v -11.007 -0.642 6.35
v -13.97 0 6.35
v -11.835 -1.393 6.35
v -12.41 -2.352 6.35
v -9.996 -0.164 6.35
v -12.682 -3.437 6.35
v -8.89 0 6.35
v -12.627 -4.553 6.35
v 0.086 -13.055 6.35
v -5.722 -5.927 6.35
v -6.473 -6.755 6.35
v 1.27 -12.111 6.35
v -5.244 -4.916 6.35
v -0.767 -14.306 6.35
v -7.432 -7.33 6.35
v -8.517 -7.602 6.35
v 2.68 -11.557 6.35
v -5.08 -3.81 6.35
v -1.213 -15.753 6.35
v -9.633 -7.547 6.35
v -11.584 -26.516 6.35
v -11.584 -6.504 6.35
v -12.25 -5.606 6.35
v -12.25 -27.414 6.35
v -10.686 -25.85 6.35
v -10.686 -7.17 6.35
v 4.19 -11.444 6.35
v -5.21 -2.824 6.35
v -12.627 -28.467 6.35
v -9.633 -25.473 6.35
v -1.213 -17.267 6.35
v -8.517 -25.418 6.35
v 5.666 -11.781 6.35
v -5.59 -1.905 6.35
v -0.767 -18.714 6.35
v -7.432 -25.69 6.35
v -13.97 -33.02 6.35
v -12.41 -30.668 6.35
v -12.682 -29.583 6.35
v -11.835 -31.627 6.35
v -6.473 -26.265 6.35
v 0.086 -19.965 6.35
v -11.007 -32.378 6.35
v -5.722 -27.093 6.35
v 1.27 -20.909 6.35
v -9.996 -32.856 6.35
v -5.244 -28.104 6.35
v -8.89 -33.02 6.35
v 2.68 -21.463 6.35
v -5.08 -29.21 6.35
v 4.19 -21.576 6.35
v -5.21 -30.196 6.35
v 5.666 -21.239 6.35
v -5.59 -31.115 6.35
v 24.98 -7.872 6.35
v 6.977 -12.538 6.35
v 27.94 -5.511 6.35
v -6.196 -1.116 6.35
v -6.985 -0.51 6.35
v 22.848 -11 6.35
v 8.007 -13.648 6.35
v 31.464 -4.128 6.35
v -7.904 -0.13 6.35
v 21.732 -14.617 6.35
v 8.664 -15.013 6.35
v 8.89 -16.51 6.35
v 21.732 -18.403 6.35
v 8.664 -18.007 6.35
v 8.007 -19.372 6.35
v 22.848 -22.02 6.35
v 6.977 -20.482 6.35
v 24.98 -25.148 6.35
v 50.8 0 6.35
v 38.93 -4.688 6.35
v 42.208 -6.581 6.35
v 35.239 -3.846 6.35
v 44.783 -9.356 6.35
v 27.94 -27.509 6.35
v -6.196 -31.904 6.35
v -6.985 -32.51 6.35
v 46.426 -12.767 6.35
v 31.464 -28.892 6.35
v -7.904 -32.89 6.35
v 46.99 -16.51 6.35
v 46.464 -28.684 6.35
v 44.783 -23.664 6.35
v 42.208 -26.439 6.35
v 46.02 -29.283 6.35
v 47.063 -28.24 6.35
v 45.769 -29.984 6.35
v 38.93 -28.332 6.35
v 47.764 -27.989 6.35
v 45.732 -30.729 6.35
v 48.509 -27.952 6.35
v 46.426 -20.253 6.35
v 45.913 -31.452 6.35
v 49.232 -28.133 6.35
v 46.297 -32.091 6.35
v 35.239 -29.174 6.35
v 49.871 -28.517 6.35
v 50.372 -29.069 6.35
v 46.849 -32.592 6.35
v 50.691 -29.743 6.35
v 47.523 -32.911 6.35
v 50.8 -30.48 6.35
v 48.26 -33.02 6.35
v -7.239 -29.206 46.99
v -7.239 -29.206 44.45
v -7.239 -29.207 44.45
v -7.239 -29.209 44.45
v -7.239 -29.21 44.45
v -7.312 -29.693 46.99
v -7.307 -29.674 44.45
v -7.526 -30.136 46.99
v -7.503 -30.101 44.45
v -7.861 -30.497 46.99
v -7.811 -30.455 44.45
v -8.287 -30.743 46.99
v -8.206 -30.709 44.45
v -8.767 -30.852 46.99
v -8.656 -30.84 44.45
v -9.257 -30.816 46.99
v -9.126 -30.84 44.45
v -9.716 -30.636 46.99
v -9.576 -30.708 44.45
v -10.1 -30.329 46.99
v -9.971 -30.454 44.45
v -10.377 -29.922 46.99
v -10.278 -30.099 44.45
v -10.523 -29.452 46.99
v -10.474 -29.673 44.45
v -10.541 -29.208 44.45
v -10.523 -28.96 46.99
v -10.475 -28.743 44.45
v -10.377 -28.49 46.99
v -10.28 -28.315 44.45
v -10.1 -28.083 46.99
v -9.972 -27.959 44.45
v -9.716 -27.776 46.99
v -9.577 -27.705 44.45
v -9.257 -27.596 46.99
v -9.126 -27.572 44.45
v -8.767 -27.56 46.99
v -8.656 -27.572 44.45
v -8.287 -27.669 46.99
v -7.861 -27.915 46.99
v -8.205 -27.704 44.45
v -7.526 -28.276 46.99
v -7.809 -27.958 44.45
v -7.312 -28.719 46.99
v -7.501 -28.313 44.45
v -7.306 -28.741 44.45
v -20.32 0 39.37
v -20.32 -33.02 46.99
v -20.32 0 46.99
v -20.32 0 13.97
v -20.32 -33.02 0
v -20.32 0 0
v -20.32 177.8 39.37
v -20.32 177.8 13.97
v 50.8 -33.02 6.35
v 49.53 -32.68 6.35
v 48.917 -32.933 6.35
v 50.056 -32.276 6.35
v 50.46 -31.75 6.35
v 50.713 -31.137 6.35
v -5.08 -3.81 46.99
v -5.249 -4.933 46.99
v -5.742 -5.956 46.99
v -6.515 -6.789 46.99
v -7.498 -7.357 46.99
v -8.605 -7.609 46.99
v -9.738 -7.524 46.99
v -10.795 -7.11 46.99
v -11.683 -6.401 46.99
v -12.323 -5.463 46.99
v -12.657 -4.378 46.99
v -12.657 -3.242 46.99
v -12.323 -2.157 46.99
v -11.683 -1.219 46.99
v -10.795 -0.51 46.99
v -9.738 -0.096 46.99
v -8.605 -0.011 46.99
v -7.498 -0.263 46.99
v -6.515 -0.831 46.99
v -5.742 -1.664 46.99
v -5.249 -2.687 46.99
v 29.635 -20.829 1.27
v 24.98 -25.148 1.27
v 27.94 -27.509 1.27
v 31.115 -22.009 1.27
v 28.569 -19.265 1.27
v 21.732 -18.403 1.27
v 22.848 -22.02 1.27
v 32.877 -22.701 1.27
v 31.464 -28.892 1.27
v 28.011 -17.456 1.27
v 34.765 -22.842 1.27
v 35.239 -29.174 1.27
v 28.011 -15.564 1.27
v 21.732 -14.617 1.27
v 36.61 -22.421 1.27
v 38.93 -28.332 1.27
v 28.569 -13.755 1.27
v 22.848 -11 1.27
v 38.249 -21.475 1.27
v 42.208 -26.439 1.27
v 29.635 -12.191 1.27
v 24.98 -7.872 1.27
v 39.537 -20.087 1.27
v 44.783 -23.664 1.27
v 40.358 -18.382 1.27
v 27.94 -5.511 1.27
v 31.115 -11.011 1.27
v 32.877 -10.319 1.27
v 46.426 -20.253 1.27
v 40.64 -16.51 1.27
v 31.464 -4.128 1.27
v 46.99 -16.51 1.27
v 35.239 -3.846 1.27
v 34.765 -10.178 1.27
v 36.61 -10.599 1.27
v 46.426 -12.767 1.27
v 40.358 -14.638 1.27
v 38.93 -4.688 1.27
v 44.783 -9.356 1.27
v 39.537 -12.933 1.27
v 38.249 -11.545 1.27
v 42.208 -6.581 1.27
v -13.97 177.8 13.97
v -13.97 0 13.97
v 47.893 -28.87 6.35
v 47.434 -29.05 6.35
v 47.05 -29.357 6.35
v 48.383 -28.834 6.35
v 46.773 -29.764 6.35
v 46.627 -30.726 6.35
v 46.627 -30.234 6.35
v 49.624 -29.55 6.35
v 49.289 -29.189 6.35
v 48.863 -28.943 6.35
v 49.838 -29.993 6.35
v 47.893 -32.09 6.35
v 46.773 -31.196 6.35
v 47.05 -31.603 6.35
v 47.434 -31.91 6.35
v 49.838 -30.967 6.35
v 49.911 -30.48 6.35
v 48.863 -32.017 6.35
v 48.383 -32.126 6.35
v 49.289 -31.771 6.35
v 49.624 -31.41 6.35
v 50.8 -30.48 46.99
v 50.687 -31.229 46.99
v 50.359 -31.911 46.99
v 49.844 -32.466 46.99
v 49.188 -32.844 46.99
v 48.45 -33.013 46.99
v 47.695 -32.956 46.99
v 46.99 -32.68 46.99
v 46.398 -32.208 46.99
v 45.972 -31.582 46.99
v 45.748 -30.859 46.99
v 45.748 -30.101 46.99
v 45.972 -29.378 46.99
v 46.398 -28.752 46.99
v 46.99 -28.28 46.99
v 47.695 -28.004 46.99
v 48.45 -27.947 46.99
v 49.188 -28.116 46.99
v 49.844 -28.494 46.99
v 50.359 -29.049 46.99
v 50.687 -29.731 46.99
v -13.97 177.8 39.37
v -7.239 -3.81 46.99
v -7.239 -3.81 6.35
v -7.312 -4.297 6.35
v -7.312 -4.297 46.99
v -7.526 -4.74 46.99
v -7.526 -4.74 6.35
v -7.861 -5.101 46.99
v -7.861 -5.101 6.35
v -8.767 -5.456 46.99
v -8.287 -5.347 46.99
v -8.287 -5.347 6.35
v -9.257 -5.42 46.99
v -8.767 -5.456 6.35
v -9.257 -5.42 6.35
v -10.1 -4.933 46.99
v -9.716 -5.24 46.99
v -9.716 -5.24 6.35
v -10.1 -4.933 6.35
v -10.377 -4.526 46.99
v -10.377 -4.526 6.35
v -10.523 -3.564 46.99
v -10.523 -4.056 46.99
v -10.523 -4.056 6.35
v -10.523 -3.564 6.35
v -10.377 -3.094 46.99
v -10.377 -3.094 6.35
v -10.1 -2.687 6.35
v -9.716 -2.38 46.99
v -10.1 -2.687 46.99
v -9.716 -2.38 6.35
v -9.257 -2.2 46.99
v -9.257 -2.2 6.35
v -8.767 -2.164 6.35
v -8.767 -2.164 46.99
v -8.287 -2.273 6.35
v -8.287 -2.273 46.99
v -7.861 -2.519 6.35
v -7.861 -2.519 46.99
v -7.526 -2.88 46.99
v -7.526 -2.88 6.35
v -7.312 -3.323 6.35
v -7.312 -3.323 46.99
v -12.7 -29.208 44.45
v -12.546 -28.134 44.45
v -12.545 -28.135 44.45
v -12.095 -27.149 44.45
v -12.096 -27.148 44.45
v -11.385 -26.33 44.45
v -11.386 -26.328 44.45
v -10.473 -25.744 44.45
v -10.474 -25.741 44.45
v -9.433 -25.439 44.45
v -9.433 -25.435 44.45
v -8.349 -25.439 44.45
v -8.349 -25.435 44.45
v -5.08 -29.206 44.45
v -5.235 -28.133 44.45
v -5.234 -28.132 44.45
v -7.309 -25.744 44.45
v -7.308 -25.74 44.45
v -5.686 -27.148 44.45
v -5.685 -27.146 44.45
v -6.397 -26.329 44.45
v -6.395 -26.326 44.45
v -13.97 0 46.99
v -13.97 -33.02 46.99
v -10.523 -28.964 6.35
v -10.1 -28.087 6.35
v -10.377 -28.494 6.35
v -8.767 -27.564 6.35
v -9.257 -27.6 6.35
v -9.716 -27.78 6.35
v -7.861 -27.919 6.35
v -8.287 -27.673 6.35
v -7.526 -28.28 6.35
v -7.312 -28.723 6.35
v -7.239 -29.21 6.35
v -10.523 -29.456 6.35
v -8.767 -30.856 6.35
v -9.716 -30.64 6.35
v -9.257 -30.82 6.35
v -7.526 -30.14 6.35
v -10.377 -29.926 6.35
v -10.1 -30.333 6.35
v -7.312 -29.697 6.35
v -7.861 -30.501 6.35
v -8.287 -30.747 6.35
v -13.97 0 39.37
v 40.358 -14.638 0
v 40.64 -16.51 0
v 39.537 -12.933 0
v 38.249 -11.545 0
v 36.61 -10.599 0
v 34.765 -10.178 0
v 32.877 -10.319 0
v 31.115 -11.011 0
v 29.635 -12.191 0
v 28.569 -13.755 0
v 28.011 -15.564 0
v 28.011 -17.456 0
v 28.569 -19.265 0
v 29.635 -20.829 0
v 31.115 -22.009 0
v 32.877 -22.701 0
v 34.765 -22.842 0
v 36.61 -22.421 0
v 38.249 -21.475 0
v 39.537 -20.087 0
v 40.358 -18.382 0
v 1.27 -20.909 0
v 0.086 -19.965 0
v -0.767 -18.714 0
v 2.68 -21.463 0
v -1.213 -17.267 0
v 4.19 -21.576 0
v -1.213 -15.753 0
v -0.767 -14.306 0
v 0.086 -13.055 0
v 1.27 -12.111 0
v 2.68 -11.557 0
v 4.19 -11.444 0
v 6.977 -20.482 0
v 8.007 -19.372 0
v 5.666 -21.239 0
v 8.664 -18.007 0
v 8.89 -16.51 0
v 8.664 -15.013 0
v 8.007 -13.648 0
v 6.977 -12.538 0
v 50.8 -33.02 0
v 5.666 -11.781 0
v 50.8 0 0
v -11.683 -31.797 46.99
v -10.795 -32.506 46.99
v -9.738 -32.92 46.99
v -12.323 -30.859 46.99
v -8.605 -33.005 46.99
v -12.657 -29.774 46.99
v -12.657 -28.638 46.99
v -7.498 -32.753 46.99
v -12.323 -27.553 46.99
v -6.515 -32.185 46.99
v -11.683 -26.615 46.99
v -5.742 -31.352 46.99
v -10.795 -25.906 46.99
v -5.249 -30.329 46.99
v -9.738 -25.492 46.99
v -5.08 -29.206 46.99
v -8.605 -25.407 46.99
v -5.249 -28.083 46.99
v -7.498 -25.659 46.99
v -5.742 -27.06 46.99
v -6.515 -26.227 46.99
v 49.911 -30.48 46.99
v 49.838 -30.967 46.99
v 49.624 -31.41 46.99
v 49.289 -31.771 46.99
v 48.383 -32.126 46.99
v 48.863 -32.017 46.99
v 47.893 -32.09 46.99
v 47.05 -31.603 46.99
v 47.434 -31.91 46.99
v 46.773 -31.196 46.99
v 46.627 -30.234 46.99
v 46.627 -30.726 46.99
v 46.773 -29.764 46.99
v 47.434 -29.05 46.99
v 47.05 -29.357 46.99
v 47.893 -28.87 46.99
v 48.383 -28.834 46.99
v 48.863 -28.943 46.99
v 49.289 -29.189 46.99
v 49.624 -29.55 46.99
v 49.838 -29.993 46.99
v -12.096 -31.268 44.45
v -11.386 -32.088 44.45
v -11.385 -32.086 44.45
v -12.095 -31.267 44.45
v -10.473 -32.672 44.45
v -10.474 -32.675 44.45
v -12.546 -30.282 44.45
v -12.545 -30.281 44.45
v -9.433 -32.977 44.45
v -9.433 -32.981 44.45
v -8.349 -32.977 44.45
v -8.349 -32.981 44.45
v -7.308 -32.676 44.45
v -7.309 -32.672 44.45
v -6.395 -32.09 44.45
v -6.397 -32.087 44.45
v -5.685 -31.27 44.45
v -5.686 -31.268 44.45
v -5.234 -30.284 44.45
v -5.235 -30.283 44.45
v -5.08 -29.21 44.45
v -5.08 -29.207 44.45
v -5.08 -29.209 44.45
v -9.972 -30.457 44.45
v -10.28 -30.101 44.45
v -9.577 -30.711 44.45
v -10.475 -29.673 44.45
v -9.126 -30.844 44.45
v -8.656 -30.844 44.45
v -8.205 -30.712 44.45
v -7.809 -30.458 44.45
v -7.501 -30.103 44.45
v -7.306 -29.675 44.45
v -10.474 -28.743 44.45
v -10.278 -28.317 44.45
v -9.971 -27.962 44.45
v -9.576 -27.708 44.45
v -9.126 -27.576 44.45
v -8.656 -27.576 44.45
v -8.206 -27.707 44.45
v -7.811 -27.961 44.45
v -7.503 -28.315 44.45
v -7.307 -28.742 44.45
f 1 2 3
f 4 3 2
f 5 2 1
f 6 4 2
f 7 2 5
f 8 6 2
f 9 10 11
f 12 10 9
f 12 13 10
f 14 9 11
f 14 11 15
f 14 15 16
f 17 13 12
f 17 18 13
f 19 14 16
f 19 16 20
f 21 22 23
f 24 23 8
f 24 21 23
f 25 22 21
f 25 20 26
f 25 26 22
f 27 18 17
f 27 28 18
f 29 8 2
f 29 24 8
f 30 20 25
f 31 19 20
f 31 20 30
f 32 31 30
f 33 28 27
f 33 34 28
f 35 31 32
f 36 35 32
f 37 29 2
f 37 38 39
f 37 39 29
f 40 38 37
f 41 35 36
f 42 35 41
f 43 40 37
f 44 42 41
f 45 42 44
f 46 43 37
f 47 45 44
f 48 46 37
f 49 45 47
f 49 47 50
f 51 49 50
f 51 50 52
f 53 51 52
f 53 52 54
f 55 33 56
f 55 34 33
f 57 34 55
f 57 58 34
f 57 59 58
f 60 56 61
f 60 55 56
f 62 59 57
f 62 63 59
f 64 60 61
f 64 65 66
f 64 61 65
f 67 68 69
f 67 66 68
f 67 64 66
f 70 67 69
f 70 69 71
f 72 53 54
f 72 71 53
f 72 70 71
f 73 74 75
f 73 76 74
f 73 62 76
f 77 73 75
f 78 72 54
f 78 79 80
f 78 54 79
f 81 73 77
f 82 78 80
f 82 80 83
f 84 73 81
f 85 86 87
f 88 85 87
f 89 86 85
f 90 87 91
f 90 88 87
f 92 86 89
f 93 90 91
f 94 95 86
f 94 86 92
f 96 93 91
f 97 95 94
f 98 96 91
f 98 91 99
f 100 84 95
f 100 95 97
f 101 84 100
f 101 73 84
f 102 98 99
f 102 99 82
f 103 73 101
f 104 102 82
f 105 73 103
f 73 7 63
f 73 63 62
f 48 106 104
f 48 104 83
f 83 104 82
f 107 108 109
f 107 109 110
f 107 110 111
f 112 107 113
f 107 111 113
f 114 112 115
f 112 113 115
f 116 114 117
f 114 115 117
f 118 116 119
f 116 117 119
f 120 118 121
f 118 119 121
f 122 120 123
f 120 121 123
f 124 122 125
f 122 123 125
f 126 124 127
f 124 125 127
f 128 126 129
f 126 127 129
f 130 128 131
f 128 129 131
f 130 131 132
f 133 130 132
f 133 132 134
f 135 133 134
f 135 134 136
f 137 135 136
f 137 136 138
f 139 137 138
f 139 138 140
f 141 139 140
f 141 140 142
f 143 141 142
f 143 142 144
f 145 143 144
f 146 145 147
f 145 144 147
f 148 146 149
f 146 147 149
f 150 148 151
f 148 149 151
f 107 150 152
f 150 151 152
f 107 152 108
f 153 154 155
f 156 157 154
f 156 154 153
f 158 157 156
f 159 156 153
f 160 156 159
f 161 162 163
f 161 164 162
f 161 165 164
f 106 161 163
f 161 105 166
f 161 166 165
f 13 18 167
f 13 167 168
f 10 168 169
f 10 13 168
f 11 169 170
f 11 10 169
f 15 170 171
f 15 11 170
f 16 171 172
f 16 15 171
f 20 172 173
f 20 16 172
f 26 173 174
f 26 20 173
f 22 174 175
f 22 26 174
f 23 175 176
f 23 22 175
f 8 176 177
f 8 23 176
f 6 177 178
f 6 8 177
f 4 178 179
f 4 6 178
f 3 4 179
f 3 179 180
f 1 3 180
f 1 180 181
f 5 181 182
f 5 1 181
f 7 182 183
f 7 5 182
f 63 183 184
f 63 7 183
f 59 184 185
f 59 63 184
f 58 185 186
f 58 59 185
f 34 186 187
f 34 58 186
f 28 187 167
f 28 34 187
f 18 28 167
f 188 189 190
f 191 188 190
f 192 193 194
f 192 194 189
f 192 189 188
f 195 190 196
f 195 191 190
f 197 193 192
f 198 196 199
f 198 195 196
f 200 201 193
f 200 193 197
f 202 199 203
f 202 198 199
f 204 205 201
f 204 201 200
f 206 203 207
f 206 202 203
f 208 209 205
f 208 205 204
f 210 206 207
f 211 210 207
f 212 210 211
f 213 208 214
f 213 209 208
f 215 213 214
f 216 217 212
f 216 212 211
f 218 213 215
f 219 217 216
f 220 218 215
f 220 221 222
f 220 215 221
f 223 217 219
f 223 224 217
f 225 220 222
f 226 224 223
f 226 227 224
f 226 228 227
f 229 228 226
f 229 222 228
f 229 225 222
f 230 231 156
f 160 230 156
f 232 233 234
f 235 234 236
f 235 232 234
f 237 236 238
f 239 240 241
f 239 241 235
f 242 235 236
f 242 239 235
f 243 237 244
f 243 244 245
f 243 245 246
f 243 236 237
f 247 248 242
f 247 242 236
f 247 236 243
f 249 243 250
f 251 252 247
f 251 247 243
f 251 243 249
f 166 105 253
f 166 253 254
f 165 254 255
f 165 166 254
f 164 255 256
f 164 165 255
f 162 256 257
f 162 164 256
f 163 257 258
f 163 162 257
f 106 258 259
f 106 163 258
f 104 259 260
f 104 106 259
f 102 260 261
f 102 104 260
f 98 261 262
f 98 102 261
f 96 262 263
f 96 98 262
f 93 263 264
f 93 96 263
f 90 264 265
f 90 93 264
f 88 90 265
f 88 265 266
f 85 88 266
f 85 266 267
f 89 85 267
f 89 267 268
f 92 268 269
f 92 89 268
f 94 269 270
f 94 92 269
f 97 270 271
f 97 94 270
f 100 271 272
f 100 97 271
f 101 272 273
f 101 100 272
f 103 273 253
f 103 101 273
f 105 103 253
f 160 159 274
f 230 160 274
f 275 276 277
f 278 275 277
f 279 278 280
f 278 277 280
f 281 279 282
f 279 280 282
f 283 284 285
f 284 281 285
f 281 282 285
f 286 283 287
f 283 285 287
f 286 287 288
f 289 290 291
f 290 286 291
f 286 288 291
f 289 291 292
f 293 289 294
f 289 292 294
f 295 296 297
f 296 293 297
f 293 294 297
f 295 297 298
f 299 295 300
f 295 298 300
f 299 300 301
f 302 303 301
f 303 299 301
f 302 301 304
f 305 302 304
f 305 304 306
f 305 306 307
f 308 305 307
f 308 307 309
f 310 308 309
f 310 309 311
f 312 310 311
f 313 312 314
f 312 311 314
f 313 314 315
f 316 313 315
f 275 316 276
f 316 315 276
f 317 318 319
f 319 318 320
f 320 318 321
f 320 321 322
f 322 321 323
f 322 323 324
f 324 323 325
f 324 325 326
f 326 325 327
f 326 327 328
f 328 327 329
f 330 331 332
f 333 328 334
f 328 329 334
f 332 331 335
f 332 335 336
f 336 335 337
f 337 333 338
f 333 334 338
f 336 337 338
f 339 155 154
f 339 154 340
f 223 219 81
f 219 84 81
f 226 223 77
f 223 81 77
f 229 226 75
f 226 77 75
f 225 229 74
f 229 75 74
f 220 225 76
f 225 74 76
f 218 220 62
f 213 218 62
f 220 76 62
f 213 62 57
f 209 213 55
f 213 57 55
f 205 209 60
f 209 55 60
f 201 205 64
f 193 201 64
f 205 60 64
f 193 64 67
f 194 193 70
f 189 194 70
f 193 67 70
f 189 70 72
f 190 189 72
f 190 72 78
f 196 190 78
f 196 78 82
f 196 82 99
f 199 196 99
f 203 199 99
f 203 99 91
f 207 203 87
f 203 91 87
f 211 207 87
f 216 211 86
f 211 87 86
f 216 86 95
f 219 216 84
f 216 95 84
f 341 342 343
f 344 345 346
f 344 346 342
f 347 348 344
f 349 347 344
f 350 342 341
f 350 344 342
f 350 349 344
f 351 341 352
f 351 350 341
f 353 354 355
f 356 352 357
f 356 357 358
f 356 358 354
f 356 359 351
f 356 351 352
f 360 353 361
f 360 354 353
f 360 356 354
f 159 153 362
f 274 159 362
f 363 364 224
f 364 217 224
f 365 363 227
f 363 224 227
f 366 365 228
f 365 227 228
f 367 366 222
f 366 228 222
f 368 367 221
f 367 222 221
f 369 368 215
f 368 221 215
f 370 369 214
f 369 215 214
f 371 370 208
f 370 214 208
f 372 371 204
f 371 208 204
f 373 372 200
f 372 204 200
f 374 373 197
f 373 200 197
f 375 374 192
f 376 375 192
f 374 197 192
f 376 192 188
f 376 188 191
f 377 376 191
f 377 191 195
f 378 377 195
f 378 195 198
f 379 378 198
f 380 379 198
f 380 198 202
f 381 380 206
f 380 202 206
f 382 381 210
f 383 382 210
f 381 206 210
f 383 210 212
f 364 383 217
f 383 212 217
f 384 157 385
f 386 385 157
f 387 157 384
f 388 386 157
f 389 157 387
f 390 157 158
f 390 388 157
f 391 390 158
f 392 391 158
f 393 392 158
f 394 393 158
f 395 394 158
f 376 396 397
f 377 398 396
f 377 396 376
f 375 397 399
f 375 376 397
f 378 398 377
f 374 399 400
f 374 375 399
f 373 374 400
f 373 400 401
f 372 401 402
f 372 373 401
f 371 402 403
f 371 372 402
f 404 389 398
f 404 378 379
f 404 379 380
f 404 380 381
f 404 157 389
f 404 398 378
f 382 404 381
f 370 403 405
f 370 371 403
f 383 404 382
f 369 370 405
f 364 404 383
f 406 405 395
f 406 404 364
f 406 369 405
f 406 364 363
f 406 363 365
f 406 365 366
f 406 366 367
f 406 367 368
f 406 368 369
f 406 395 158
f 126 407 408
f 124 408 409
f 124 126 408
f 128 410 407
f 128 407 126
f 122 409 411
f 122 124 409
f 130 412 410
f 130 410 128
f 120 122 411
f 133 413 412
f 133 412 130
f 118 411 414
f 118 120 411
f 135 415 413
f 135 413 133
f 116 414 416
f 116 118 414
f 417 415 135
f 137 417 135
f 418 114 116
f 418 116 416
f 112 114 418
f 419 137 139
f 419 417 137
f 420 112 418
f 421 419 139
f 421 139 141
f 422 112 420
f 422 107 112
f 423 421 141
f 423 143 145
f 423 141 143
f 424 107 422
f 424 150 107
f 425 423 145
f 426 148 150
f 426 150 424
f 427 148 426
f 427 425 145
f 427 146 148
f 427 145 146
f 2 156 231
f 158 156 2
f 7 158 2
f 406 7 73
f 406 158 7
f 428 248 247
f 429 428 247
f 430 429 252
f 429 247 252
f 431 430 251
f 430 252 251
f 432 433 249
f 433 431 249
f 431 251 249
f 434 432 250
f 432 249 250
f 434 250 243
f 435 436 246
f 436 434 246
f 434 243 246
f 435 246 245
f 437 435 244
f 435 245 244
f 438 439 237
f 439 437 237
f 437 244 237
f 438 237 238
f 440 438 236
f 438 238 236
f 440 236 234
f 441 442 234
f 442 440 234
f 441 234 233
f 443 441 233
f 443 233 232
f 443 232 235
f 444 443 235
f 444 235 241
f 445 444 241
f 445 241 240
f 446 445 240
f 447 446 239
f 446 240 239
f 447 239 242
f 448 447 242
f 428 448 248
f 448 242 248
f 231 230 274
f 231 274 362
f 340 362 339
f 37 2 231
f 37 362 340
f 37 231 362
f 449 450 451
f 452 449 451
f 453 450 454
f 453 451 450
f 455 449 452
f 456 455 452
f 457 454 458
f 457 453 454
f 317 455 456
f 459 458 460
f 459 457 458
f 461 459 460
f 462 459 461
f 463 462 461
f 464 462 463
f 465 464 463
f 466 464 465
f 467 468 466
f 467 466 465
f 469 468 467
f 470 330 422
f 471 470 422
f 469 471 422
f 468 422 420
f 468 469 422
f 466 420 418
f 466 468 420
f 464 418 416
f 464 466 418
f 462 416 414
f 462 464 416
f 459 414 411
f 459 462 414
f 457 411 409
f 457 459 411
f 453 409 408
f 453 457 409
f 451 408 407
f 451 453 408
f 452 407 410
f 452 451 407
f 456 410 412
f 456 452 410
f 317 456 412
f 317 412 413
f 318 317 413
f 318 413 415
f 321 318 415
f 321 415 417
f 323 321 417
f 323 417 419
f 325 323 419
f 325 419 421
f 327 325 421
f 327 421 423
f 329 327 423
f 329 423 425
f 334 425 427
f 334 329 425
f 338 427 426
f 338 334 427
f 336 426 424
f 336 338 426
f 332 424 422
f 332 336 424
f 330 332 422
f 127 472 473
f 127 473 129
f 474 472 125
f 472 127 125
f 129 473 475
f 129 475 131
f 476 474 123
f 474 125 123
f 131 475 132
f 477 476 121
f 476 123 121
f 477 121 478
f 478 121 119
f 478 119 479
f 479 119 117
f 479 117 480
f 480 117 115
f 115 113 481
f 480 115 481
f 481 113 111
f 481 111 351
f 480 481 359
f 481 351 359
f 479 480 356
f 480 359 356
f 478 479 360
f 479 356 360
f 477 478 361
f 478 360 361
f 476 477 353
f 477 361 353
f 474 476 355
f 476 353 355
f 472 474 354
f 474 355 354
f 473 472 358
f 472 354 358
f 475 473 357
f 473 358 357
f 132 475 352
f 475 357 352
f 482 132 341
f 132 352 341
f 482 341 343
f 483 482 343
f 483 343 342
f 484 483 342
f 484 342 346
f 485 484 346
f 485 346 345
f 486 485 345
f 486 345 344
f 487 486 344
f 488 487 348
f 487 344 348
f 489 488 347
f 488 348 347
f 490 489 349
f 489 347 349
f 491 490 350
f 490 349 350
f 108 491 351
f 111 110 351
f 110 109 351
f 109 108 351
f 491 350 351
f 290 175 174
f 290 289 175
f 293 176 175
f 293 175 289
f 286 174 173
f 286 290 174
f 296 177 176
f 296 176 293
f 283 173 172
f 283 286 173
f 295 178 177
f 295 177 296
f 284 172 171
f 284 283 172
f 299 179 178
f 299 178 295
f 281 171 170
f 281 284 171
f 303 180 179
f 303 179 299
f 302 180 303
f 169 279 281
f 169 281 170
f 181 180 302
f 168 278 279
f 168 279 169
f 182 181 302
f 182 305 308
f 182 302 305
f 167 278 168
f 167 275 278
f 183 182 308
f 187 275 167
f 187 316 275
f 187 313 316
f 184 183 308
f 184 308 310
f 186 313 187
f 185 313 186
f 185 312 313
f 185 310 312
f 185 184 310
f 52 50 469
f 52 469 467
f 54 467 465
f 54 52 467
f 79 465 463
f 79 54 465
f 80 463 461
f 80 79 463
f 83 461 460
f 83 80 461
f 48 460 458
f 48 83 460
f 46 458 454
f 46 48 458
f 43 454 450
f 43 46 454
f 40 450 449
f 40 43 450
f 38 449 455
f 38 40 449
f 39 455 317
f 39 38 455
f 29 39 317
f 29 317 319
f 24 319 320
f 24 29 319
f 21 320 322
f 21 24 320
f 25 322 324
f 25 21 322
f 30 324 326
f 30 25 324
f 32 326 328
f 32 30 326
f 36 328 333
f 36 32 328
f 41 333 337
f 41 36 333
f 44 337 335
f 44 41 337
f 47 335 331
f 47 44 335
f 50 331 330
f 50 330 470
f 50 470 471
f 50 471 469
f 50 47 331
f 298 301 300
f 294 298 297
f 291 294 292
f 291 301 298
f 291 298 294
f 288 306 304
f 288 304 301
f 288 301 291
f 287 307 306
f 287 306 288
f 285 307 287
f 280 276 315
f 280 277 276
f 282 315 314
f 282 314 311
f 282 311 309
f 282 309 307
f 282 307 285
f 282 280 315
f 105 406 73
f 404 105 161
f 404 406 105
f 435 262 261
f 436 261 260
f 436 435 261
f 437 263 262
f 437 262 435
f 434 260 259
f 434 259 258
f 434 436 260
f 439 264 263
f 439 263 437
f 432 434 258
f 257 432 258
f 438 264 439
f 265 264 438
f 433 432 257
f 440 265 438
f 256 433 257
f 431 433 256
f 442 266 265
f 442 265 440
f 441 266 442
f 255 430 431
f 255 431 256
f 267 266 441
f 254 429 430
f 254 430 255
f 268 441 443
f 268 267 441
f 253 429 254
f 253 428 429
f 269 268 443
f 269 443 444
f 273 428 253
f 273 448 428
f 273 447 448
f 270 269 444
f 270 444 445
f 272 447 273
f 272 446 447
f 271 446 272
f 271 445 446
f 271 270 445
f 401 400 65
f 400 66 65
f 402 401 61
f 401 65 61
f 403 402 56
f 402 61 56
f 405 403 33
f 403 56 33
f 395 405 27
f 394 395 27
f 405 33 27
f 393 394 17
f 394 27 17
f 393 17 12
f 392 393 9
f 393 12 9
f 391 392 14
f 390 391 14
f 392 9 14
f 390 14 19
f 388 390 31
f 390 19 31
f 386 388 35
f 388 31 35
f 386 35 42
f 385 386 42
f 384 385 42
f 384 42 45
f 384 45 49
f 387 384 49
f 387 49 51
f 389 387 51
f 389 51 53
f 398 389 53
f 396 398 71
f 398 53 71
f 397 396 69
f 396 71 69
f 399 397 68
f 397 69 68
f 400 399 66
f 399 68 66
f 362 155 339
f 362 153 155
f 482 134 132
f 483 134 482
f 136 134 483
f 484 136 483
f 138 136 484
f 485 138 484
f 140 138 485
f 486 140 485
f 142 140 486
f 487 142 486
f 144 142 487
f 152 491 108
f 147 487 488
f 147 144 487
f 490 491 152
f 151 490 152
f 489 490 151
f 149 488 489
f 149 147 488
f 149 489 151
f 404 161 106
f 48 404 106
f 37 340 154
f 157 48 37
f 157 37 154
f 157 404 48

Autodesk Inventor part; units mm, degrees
ref_plane "YZ Plane" through (0, 0, 0) normal (1, 0, 0) x (0, 1, 0)
ref_plane "XZ Plane" through (0, 0, 0) normal (0, 1, 0) x (-1, 0, 0)
ref_plane "XY Plane" through (0, 0, 0) normal (0, 0, 1) x (1, 0, 0)
sketch "Sketch1" plane through (0, 0, 0) normal (0, 0, 1) x (1, 0, 0)
  line L0 (0, 0) -> (50.8, 0)
  line L1 (50.8, 0) -> (50.8, -33.02)
  line L2 (50.8, -33.02) -> (0, -33.02)
  line L3 (0, -33.02) -> (0, 0)
  dimension "d0" = 50.8
  dimension "d1" = 33.02
extrude "Extrusion1" add sketch "Sketch1" along normal blind 6.35
sketch "Sketch2" plane through (0, 0, 6.35) normal (0, 0, 1) x (1, 0, 0)
  line L0 (50.8, 0) -> (0, 0) projected
  line L1 (0, 0) -> (0, -33.02) projected
  circle A0 centre (34.29, -16.51) radius 12.7
  point P0 (7.62, -16.51)
  dimension "d4" = 16.51
  dimension "d5" = 16.51
  dimension "d6" = 26.67
  dimension "d7" = 7.62
  dimension "d8" = 25.4
extrude "Extrusion2" cut sketch "Sketch2" against normal blind 5.08
sketch "Sketch3" plane through (34.29, -16.51, 1.27) normal (0, 0, 1) x (1, 0, 0)
  circle A0 centre (0, 0) radius 6.35
  point P0 (-34.29, 16.51)
  dimension "d11" = 12.7
extrude "Extrusion3" cut sketch "Sketch3" against normal blind 5.08
sketch "Sketch14" plane through (0, -33.02, 0) normal (-1, 0, 0) x (0, 0, 1)
  line L0 (0, 33.02) -> (6.35, 33.02)
  line L1 (6.35, 33.02) -> (6.35, 0)
  line L2 (6.35, 0) -> (0, 0)
  line L3 (0, 0) -> (0, 33.02)
extrude "Extrusion14" add sketch "Sketch14" along normal blind 12.7
sketch "Sketch15" plane through (0, 0, 6.35) normal (0, 0, 1) x (1, 0, 0)
  line L0 (-12.7, -33.02) -> (-12.7, 0) projected
  line L1 (50.8, -33.02) -> (-12.7, -33.02) projected
  line L2 (50.8, 0) -> (-12.7, 0) projected
  circle A0 centre (-8.89, -3.81) radius 3.81
  circle A1 centre (-8.89, -29.21) radius 3.81
  circle A2 centre (-8.89, -29.21) radius 1.651
  circle A3 centre (-8.89, -3.81) radius 1.651
  point P0 (0, 0)
  dimension "d58" = 3.81
  dimension "d59" = 3.81
  dimension "d60" = 3.81
  dimension "d61" = 3.81
  dimension "d62" = 7.62
  dimension "d63" = 7.62
  dimension "d64" = 3.302
  dimension "d65" = 3.302
extrude "Extrusion15" add sketch "Sketch15" along normal blind 38.1 contours A1 | A0
sketch "Sketch16" plane through (0, 0, 6.35) normal (0, 0, 1) x (1, 0, 0)
  circle A0 centre (48.26, -30.48) radius 2.54
  line L0 (50.8, -33.02) -> (-8.89, -33.02) projected
  line L1 (50.8, -33.02) -> (50.8, 0) projected
  circle A1 centre (48.26, -30.48) radius 1.651
  point P0 (0, 0)
  dimension "d68" = 5.08
  dimension "d69" = 2.54
  dimension "d70" = 2.54
  dimension "d71" = 3.302
extrude "Extrusion16" add sketch "Sketch16" along normal blind 38.1 contours A0
sketch "Sketch17" plane through (-8.89, -3.81, 44.45) normal (0, 0, 1) x (1, 0, 0)
  circle A0 centre (0, 0) radius 1.651 projected
  circle A1 centre (0, 0) radius 1.651
  circle A2 centre (0, 0) radius 3.81
  circle A3 centre (0, -25.396) radius 1.651
  circle A4 centre (0, -25.396) radius 3.81
  circle A5 centre (57.15, -26.67) radius 1.651 projected
  circle A6 centre (57.15, -26.67) radius 1.651
  circle A7 centre (57.15, -26.67) radius 2.54
  point P0 (8.89, 3.81)
  dimension "d74" = 3.302
  dimension "d75" = 7.62
  dimension "d76" = 3.302
  dimension "d77" = 7.62
  dimension "d78" = 5.08
extrude "Extrusion17" add sketch "Sketch17" along normal blind 2.54
sketch "Sketch18" plane through (-12.7, -33.02, 0) normal (-1, 0, 0) x (0, 0, 1)
  line L0 (6.35, 3.81) -> (6.35, 0) projected
  line L1 (0, 33.02) -> (6.35, 33.02)
  line L2 (6.35, 33.02) -> (6.35, 0)
  line L3 (6.35, 0) -> (0, 0)
  line L4 (0, 0) -> (0, 33.02)
extrude "Extrusion18" add sketch "Sketch18" along normal blind 12.7
sketch "Sketch20" plane through (-25.4, -33.02, 0) normal (-1, 0, 0) x (0, 0, 1)
  line L0 (0, 33.02) -> (0, 0) projected
  line L1 (0, 0) -> (6.35, 0) projected
  line L2 (0, 33.02) -> (6.35, 33.02)
  line L3 (6.35, 33.02) -> (6.35, 0)
  line L4 (6.35, 0) -> (0, 0)
  line L5 (0, 0) -> (0, 33.02)
extrude "Extrusion20" cut sketch "Sketch20" against normal blind 5.08
sketch "Sketch21" plane through (0, 0, 6.35) normal (0, 0, 1) x (1, 0, 0)
  line L0 (-20.32, 0) -> (50.8, 0) projected
  line L1 (-20.32, 0) -> (-13.97, 0)
  line L2 (-13.97, 0) -> (-13.97, -33.02)
  line L3 (-13.97, -33.02) -> (-20.32, -33.02)
  line L4 (-20.32, -33.02) -> (-20.32, 0)
  point P0 (0, 0)
  dimension "d88" = 6.35
  dimension "d89" = 33.02
extrude "Extrusion21" add sketch "Sketch21" along normal blind 40.64
sketch "Sketch23" plane through (50.8, 0, 6.35) normal (0, 1, 0) x (1, 0, 0)
  line L0 (-64.77, 0) -> (-64.77, -40.64) projected
  line L1 (-64.77, -7.62) -> (-71.12, -7.62)
  line L2 (-71.12, -7.62) -> (-71.12, -33.02)
  line L3 (-71.12, -33.02) -> (-64.77, -33.02)
  line L4 (-64.77, -33.02) -> (-64.77, -7.62)
  line L5 (-64.77, -40.64) -> (-71.12, -40.64) projected
  point P0 (-50.8, 6.35)
  dimension "d94" = 25.4
  dimension "d95" = 6.35
  dimension "d96" = 7.62
extrude "Extrusion23" add sketch "Sketch23" along normal blind 177.8
sketch "Sketch24" plane through (0, 0, 6.35) normal (0, 0, 1) x (1, 0, 0)
  circle A0 centre (3.81, -16.51) radius 5.08
  circle A1 centre (34.29, -16.51) radius 6.35 projected
  line L0 (48.26, -33.02) -> (-8.89, -33.02) projected
  point P0 (0, 0)
  dimension "d99" = 10.16
  dimension "d100" = 30.48
  dimension "d101" = 16.51
extrude "Extrusion24" cut sketch "Sketch24" against normal blind 25.4 contours A0
properties part number "servo attachment claw"
